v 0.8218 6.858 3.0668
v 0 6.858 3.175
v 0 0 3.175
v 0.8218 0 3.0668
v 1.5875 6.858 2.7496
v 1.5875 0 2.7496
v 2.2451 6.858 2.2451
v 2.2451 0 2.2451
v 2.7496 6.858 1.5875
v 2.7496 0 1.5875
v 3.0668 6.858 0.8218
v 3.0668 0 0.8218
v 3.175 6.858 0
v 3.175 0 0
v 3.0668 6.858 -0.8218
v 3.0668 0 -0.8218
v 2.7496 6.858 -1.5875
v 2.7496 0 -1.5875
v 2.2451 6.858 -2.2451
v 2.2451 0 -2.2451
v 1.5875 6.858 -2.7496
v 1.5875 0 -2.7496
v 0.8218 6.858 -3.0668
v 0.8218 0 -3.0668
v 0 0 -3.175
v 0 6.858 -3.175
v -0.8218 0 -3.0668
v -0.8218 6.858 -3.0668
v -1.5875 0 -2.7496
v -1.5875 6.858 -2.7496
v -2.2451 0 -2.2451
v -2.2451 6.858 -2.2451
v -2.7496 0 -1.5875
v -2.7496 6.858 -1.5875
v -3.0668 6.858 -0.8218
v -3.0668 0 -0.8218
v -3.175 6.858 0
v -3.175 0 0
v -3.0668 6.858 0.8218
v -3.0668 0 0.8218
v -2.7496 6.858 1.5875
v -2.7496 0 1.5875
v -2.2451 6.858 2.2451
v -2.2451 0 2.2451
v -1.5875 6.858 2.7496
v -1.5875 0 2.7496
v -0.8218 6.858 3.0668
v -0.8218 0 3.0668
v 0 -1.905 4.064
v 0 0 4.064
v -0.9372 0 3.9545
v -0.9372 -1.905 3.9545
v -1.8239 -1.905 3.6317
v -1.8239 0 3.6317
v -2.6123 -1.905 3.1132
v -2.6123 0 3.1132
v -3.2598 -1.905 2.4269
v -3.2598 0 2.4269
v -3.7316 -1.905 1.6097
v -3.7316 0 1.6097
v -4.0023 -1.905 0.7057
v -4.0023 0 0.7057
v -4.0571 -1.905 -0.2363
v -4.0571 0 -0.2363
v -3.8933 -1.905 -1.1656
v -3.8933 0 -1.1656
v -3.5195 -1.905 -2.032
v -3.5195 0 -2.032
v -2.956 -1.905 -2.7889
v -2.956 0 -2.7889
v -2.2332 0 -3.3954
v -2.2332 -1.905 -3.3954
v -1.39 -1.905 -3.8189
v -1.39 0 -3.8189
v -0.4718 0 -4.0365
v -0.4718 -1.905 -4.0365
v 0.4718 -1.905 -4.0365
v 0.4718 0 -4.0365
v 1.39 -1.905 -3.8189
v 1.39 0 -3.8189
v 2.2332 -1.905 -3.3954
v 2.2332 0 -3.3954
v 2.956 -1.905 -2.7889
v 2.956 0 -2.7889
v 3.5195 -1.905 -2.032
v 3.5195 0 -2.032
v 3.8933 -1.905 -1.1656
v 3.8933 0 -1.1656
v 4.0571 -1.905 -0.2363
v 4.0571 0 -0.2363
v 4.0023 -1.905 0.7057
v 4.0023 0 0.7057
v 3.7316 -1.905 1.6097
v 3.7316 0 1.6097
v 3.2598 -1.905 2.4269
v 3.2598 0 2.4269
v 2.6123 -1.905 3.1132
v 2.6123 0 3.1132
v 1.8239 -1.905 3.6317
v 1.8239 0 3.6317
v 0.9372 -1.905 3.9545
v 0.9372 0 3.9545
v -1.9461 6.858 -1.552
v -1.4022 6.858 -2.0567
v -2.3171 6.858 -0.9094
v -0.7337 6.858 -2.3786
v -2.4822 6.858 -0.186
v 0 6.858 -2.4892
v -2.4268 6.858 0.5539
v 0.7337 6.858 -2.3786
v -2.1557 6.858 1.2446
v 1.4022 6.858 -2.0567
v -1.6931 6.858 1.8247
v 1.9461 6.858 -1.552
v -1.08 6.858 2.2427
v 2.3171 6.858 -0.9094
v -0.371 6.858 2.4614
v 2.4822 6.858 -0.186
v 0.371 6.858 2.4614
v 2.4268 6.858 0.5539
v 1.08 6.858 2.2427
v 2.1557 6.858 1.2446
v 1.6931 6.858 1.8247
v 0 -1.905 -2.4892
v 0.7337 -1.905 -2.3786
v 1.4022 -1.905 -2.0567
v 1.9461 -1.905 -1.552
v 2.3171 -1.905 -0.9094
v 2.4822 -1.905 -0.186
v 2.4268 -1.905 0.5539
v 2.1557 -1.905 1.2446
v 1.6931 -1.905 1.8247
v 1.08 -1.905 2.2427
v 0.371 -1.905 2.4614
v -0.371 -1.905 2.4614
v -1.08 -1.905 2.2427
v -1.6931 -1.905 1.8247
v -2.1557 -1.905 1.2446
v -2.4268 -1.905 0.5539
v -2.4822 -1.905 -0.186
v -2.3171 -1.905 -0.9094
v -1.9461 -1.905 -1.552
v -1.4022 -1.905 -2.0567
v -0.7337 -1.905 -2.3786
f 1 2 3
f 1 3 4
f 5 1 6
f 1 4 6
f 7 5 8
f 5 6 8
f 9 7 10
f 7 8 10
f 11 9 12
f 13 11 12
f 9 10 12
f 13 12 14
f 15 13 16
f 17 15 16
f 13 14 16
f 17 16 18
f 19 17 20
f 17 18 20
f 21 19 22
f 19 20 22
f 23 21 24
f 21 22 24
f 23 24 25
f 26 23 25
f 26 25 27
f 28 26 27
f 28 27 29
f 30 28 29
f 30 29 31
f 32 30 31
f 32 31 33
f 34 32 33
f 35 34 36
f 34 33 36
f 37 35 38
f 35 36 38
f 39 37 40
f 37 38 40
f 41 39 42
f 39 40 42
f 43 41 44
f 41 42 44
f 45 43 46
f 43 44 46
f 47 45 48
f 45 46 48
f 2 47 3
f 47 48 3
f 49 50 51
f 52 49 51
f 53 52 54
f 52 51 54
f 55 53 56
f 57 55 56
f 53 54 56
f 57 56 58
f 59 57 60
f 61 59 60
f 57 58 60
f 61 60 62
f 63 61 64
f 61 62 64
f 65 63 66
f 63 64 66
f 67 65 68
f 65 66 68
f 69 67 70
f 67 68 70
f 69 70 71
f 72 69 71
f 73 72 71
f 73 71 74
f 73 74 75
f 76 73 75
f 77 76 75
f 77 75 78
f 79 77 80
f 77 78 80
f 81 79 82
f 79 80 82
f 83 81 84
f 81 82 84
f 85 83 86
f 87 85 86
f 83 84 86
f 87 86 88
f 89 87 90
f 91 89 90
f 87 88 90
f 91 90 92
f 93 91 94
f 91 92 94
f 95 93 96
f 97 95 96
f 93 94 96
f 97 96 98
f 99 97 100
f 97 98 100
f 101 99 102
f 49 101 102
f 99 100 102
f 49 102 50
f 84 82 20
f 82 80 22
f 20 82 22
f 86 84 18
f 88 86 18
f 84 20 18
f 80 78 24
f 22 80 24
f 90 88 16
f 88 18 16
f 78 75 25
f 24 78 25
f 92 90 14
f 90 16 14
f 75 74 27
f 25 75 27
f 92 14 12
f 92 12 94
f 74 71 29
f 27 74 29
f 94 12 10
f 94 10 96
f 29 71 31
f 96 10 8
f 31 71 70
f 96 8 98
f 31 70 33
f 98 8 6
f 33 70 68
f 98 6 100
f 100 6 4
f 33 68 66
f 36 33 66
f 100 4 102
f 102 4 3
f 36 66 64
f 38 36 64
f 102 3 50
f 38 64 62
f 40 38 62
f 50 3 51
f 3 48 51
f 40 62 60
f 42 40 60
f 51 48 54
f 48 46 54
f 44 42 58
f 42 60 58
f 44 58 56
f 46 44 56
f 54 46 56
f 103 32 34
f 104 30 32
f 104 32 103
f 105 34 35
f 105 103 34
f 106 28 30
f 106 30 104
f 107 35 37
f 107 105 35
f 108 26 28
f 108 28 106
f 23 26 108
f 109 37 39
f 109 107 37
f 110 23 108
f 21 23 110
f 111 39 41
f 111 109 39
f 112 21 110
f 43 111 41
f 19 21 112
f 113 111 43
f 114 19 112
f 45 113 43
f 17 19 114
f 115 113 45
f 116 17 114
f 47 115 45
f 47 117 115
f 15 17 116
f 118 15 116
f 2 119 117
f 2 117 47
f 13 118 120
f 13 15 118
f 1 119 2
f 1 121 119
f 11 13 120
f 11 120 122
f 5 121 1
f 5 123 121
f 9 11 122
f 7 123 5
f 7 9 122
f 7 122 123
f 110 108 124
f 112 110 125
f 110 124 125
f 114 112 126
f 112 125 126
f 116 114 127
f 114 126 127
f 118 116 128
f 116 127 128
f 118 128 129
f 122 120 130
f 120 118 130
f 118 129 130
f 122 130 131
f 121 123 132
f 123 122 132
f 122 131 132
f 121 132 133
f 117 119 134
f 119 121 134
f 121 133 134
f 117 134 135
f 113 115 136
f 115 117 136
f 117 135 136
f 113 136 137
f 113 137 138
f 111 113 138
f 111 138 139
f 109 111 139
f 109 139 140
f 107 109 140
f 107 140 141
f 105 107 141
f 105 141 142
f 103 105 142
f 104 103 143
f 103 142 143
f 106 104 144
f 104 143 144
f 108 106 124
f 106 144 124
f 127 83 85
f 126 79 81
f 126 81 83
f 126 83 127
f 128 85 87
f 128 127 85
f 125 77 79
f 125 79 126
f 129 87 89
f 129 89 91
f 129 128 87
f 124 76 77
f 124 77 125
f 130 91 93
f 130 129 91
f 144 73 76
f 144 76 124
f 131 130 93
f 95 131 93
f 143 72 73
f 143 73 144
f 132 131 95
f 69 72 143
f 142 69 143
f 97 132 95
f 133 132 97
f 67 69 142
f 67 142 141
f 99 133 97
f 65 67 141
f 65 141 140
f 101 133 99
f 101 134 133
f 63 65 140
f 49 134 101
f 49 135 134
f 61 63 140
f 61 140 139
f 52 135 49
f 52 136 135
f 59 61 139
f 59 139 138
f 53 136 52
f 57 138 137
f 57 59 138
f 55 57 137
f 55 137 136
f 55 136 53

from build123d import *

# Parameters (mm, degrees)
SKETCH1_R           = 3.175
SKETCH1_R_2         = 2.4892
BOSS_EXTRUDE1_DEPTH = 6.858
SKETCH2_R           = 4.064
BOSS_EXTRUDE2_DEPTH = 1.905
SKETCH3_R           = 2.4892
CUT_EXTRUDE1_DEPTH  = 11.479616453


with BuildPart() as part:
    # Sketch1 → Boss-Extrude1 (new body)
    with BuildSketch(Plane(origin=(0, 0, 0), x_dir=(1, 0, 0), z_dir=(0, 1, 0))):
        with Locations(Location((0, 0, 0), (0, 0, 270))):
            Circle(SKETCH1_R)
        with Locations(Location((0, 0, 0), (0, 0, 270))):
            Circle(SKETCH1_R_2, mode=Mode.SUBTRACT)
    extrude(amount=BOSS_EXTRUDE1_DEPTH)

    # Sketch2 → Boss-Extrude2 (add)
    with BuildSketch(Plane.XZ):
        with Locations(Location((0, 0, 0), (0, 0, 90))):
            Circle(SKETCH2_R)
    extrude(amount=BOSS_EXTRUDE2_DEPTH)

    # Sketch3 → Cut-Extrude1 (cut, through all)
    with BuildSketch(Plane.XZ.offset(1.905)):
        with Locations(Location((0, 0, 0), (0, 0, 270))):
            Circle(SKETCH3_R)
    extrude(amount=-CUT_EXTRUDE1_DEPTH, mode=Mode.SUBTRACT)


solid = part.part
